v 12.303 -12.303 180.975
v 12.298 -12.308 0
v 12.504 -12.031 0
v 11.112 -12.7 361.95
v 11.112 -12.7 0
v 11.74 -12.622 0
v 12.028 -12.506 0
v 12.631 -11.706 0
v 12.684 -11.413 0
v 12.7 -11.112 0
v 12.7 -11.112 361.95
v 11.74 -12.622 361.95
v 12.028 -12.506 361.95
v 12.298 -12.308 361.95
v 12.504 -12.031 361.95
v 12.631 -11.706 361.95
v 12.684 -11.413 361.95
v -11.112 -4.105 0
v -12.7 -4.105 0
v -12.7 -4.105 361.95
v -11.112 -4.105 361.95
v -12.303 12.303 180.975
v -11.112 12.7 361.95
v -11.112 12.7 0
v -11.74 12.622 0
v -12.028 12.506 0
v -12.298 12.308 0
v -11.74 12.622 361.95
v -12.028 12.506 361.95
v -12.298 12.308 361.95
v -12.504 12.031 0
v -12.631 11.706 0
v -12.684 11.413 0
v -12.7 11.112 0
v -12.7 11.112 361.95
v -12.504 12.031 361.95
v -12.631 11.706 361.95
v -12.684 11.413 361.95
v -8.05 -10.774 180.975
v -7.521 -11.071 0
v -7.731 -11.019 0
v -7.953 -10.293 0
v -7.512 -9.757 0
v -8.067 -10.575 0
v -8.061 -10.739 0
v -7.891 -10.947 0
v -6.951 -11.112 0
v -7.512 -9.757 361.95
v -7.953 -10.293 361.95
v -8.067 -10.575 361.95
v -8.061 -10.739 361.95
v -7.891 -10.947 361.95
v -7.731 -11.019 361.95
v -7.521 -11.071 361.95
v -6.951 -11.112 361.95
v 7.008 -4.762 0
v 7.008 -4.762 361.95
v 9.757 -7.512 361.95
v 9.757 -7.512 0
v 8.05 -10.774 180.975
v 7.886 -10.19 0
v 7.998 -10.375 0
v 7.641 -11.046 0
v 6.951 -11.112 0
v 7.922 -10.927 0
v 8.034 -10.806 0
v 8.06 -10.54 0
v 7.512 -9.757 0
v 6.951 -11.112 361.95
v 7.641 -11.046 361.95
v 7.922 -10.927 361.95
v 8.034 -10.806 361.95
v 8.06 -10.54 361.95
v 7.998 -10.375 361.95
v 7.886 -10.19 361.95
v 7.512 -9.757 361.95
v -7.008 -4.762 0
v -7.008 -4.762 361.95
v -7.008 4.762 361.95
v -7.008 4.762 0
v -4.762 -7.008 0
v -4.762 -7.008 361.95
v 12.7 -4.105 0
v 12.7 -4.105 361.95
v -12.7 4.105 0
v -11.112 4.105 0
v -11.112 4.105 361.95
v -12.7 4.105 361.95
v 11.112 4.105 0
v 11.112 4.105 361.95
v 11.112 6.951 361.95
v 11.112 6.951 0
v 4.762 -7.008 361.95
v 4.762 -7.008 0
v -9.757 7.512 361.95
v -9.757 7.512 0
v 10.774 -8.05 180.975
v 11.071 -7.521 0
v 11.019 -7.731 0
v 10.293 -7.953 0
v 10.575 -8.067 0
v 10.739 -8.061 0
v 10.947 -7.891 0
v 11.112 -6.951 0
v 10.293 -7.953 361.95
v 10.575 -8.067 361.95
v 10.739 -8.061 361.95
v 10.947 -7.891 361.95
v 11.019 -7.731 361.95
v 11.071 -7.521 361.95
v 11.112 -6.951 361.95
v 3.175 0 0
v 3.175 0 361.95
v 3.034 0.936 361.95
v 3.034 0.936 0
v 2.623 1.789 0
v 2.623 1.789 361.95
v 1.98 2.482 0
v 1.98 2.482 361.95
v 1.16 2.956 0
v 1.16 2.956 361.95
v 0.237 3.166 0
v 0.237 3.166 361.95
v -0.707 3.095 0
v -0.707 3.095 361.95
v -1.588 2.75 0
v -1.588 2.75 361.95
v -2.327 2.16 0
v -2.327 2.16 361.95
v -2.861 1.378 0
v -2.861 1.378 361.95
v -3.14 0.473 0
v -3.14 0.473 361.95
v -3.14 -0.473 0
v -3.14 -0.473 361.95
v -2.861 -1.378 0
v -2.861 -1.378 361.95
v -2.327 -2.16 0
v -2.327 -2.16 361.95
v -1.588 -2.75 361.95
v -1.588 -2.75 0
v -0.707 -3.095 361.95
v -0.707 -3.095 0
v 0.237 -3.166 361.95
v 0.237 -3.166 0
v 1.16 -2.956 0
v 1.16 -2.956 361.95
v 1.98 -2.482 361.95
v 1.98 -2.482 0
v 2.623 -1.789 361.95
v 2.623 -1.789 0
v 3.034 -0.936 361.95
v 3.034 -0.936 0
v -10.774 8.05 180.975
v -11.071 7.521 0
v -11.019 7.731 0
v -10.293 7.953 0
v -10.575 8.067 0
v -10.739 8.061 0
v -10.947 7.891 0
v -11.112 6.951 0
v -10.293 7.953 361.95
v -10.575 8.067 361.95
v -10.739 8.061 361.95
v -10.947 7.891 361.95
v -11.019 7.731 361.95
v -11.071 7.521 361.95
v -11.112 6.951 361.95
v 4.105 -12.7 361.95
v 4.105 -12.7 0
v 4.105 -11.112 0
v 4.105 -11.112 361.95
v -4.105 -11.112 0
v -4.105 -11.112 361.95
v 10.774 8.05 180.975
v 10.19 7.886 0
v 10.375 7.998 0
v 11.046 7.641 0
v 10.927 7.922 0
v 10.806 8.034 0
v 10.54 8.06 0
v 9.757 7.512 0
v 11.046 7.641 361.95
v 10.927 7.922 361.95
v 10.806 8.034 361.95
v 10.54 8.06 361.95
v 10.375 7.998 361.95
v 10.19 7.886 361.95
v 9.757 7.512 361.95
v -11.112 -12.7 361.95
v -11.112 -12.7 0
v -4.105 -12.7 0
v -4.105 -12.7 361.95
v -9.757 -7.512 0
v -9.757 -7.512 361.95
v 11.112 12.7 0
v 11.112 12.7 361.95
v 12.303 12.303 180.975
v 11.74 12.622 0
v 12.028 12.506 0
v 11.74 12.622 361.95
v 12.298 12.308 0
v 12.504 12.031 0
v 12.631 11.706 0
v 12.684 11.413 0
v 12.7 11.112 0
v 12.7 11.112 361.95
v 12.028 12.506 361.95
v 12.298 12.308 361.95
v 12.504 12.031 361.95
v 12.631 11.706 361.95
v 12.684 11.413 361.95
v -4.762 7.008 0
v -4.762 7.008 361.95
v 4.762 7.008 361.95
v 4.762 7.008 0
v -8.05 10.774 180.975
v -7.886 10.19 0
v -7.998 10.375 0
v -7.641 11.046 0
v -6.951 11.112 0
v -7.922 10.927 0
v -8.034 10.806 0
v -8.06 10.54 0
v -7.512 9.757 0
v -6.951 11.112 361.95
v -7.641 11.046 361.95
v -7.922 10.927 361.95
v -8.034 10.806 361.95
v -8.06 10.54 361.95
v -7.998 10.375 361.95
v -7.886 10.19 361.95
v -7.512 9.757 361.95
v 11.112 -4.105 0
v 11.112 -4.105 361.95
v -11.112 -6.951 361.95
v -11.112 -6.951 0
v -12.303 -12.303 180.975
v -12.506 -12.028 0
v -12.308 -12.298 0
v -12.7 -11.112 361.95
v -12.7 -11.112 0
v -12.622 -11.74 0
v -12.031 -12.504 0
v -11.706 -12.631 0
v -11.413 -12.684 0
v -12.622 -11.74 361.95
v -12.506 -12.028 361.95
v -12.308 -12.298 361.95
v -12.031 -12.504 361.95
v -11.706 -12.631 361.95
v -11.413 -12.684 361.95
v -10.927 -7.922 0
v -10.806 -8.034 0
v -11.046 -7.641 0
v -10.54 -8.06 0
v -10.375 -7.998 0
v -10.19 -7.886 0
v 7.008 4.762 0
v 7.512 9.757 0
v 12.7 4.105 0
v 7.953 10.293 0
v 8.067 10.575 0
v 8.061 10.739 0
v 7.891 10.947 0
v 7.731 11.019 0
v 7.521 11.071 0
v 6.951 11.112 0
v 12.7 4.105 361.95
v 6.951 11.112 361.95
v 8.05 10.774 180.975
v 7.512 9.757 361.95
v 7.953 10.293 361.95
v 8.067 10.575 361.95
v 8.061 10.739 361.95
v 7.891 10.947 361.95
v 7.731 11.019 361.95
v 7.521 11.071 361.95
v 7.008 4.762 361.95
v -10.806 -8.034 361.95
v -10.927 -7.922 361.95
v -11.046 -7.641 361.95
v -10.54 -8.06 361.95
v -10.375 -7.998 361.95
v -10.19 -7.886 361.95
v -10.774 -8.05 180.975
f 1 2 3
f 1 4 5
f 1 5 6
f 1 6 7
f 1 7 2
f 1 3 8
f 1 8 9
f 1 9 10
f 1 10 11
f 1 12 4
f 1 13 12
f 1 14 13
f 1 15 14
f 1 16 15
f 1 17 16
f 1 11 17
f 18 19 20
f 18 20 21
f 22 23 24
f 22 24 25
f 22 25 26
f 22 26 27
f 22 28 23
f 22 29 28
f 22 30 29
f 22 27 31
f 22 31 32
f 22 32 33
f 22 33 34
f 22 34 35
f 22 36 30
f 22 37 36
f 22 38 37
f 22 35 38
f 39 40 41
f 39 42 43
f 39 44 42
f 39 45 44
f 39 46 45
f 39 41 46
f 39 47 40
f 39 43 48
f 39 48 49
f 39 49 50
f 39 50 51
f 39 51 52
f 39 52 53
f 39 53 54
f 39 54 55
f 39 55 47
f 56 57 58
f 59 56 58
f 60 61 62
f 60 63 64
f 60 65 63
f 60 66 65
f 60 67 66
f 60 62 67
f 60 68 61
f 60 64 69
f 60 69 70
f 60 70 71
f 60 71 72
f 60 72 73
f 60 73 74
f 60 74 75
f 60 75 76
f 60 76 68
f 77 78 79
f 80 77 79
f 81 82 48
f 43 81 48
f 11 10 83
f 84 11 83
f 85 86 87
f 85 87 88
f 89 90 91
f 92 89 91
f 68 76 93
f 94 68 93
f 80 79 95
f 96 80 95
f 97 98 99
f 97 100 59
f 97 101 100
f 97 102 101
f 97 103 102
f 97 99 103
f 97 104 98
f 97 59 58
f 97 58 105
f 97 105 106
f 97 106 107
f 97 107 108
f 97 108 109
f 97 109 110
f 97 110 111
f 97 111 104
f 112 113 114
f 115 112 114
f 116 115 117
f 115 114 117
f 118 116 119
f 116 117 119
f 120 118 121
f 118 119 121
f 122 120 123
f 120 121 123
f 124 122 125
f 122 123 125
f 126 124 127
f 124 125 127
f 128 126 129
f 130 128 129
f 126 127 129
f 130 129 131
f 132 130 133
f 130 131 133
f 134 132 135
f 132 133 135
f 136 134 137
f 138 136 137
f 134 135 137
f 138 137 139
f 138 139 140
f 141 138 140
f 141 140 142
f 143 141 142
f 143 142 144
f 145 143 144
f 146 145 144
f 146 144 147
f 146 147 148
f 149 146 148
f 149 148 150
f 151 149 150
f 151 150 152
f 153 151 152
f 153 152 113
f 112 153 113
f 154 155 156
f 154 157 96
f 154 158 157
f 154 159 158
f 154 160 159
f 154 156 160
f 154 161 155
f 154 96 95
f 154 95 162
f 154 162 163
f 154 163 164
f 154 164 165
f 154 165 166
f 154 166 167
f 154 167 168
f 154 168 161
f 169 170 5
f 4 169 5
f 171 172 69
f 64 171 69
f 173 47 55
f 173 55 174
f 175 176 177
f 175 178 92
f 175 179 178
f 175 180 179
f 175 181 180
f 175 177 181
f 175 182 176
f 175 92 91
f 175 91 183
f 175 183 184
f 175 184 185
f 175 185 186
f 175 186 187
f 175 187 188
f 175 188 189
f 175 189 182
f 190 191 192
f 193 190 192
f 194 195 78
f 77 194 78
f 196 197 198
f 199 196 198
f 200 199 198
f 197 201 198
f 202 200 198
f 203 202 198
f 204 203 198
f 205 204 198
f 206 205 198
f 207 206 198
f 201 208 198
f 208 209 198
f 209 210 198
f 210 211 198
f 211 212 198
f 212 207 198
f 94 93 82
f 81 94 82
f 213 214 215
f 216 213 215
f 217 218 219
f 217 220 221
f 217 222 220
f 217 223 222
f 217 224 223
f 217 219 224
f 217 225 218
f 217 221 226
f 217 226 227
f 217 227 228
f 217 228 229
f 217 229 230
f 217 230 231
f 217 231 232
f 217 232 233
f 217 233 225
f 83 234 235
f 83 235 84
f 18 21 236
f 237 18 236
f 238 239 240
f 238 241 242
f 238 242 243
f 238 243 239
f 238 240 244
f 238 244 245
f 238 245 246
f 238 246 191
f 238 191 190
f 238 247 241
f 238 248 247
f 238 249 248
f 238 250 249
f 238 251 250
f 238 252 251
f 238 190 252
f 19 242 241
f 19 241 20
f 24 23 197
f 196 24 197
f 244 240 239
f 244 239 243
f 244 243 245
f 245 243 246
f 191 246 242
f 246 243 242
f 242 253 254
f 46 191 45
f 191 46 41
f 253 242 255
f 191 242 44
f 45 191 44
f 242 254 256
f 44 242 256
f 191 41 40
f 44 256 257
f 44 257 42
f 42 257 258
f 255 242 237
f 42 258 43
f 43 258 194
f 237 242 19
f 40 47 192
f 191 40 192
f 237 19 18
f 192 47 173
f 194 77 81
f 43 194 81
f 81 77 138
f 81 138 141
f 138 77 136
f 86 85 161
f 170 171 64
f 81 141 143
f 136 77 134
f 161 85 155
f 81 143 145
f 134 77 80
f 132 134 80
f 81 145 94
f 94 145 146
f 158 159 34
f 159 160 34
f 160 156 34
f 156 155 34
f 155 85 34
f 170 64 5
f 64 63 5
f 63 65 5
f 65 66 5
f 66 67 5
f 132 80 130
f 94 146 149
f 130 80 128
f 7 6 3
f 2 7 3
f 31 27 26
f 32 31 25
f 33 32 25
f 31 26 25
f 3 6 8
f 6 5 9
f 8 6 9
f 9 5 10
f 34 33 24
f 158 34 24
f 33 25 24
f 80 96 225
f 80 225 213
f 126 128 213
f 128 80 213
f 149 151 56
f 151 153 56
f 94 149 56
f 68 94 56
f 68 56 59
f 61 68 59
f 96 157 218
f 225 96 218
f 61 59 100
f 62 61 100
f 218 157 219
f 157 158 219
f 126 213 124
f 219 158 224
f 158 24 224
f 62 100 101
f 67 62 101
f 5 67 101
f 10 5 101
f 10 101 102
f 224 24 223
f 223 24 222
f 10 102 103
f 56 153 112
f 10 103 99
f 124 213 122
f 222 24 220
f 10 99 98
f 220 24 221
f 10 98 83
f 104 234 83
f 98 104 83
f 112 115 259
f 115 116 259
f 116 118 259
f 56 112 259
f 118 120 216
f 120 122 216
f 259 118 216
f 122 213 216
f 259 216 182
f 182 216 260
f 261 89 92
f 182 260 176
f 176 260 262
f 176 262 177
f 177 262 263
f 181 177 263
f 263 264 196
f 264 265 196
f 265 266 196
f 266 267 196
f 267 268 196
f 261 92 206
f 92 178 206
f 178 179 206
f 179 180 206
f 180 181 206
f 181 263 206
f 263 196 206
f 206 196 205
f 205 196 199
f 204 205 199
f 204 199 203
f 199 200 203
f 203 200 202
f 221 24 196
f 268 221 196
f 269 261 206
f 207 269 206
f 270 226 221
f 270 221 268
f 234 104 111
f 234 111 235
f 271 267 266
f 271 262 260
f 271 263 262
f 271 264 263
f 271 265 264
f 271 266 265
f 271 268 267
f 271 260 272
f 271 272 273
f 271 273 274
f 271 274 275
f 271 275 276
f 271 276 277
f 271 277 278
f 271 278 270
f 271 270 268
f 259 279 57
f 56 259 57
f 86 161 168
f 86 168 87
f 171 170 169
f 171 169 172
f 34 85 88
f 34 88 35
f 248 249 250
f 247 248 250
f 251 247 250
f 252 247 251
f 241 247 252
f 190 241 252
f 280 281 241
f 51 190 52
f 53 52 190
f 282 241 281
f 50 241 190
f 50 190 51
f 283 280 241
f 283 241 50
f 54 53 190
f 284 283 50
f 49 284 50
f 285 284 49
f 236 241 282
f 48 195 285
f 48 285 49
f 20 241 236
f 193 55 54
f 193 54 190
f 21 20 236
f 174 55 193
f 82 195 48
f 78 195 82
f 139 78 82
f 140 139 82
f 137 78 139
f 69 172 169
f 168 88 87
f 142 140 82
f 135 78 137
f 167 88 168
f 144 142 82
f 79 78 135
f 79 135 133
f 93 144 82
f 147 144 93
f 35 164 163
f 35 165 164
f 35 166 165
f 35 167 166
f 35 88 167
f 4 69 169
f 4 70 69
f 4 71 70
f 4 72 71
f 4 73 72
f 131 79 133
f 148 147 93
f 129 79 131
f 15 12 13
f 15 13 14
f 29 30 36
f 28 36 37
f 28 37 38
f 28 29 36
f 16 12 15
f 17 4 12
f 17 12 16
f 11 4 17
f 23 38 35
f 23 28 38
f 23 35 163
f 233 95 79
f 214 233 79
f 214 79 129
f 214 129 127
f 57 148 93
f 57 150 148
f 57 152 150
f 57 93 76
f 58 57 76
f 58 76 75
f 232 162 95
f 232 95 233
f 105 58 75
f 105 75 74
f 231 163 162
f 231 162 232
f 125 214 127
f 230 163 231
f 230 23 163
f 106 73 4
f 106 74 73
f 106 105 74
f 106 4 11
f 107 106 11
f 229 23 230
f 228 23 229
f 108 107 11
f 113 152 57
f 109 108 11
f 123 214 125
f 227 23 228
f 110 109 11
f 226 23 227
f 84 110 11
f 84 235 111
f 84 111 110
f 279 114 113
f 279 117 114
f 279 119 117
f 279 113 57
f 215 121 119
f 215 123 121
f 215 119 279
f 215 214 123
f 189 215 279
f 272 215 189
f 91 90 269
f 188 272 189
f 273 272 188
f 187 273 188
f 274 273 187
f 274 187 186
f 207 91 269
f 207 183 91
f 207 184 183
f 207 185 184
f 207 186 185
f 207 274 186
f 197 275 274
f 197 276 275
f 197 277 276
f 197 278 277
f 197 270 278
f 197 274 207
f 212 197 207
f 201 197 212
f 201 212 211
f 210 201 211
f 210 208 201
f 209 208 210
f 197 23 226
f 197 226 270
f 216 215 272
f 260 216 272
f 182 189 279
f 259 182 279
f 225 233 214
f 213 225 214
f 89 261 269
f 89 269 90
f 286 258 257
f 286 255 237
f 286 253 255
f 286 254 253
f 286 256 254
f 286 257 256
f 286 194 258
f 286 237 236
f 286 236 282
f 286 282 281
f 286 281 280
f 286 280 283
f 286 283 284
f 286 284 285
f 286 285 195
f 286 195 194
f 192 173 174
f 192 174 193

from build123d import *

# Parameters (mm, degrees)
F0_W        = 25.4
F0_H        = 25.4
F1_DEPTH    = 455.93
F3_DEPTH    = 455.93
F4_R        = 3.175
F5_DEPTH    = 455.93
F6_T1_DEPTH = 463.8675
F7_T1_DEPTH = 455.93
F8_W        = 8.2098719395
F8_H        = 1.5875
F9_DEPTH    = 455.93
F10_DEPTH   = 93.98


# Not quite as in the source:
# - a fillet or chamfer that OpenCascade refuses, or shapes differently, is made with other operations: its cross-section is extruded or revolved along the edge and cut away or added


with BuildPart() as f1:
    # F0 (on Top) → F1 (new body)
    with BuildSketch(Plane.XY):
        Rectangle(F0_W, F0_H)
    extrude(amount=F1_DEPTH)

    # F2 (on face) → F3 (cut)
    with BuildSketch(Plane.XY.offset(455.93)):
        Polygon((-7.0075640303, -4.7625), (-7.0075640303, 4.7625), (-11.1125, 8.8674359697), (-11.1125, 4.1049359697), (-12.7, 4.1049359697), (-12.7, -4.1049359697), (-11.1125, -4.1049359697), (-11.1125, -8.8674359697), align=None)
        Polygon((4.1049359697, 12.7), (-4.1049359697, 12.7), (-4.1049359697, 11.1125), (-8.8674359697, 11.1125), (-4.7625, 7.0075640303), (4.7625, 7.0075640303), (8.8674359697, 11.1125), (4.1049359697, 11.1125), align=None)
        Polygon((12.7, -4.1049359697), (12.7, 4.1049359697), (11.1125, 4.1049359697), (11.1125, 8.8674359697), (7.0075640303, 4.7625), (7.0075640303, -4.7625), (11.1125, -8.8674359697), (11.1125, -4.1049359697), align=None)
        Polygon((-4.1049359697, -11.1125), (-4.1049359697, -12.7), (4.1049359697, -12.7), (4.1049359697, -11.1125), (8.8674359697, -11.1125), (4.7625, -7.0075640303), (-4.7625, -7.0075640303), (-8.8674359697, -11.1125), align=None)
    extrude(amount=-F3_DEPTH, mode=Mode.SUBTRACT)

    # F4 (on face) → F5 (cut)
    with BuildSketch(Plane.XY.offset(455.93)):
        Circle(F4_R)
    extrude(amount=-F5_DEPTH, mode=Mode.SUBTRACT)

    # F6: fillet of radius 1.5875 on 4 edges, made by hand

    # F6_s2 → F6_t1 (cut)
    with BuildSketch(Plane.XY.offset(-3.96875)):
        with BuildLine():
            add(Edge.make_bspline(
                [(-12.7, 11.1125), (-12.7, 12.7), (-11.1125, 12.7)],
                knots=[0, 0, 0, 1, 1, 1], degree=2, weights=[1, 1, 1]))
            Line((-11.1125, 12.7), (-12.7, 12.7))
            Line((-12.7, 12.7), (-12.7, 11.1125))
        make_face()
        with BuildLine():
            add(Edge.make_bspline(
                [(12.7, 11.1125), (12.7, 12.7), (11.1125, 12.7)],
                knots=[0, 0, 0, 1, 1, 1], degree=2, weights=[1, 1, 1]))
            Line((11.1125, 12.7), (12.7, 12.7))
            Line((12.7, 12.7), (12.7, 11.1125))
        make_face()
        with BuildLine():
            add(Edge.make_bspline(
                [(12.7, -11.1125), (12.7, -12.7), (11.1125, -12.7)],
                knots=[0, 0, 0, 1, 1, 1], degree=2, weights=[1, 1, 1]))
            Line((11.1125, -12.7), (12.7, -12.7))
            Line((12.7, -12.7), (12.7, -11.1125))
        make_face()
        with BuildLine():
            add(Edge.make_bspline(
                [(-11.1125, -12.7), (-12.7, -12.7), (-12.7, -11.1125)],
                knots=[0, 0, 0, 1, 1, 1], degree=2, weights=[1, 1, 1]))
            Line((-12.7, -11.1125), (-12.7, -12.7))
            Line((-12.7, -12.7), (-11.1125, -12.7))
        make_face()
    extrude(amount=F6_T1_DEPTH, mode=Mode.SUBTRACT)

    # F7: fillet of radius 0.79375 on 8 edges, made by hand

    # F7_s2 → F7_t1 (join)
    with BuildSketch(Plane.XY):
        with BuildLine():
            add(Edge.make_bspline(
                [(-9.7574839924, 7.5124199622), (-11.1125, 8.8674359697), (-11.1125, 6.9511539546)],
                knots=[0, 0, 0, 1, 1, 1], degree=2, weights=[1, 1, 1]))
            Line((-11.1125, 6.9511539546), (-11.1125, 8.8674359697))
            Line((-11.1125, 8.8674359697), (-9.7574839924, 7.5124199622))
        make_face()
        with BuildLine():
            add(Edge.make_bspline(
                [(11.1125, 6.9511539546), (11.1125, 8.8674359697), (9.7574839924, 7.5124199622)],
                knots=[0, 0, 0, 1, 1, 1], degree=2, weights=[1, 1, 1]))
            Line((9.7574839924, 7.5124199622), (11.1125, 8.8674359697))
            Line((11.1125, 8.8674359697), (11.1125, 6.9511539546))
        make_face()
        with BuildLine():
            add(Edge.make_bspline(
                [(9.7574839924, -7.5124199622), (11.1125, -8.8674359697), (11.1125, -6.9511539546)],
                knots=[0, 0, 0, 1, 1, 1], degree=2, weights=[1, 1, 1]))
            Line((11.1125, -6.9511539546), (11.1125, -8.8674359697))
            Line((11.1125, -8.8674359697), (9.7574839924, -7.5124199622))
        make_face()
        with BuildLine():
            add(Edge.make_bspline(
                [(-11.1125, -6.9511539546), (-11.1125, -8.8674359697), (-9.7574839924, -7.5124199622)],
                knots=[0, 0, 0, 1, 1, 1], degree=2, weights=[1, 1, 1]))
            Line((-9.7574839924, -7.5124199622), (-11.1125, -8.8674359697))
            Line((-11.1125, -8.8674359697), (-11.1125, -6.9511539546))
        make_face()
        with BuildLine():
            add(Edge.make_bspline(
                [(-7.5124199622, -9.7574839924), (-8.8674359697, -11.1125), (-6.9511539546, -11.1125)],
                knots=[0, 0, 0, 1, 1, 1], degree=2, weights=[1, 1, 1]))
            Line((-6.9511539546, -11.1125), (-8.8674359697, -11.1125))
            Line((-8.8674359697, -11.1125), (-7.5124199622, -9.7574839924))
        make_face()
        with BuildLine():
            add(Edge.make_bspline(
                [(6.9511539546, -11.1125), (8.8674359697, -11.1125), (7.5124199622, -9.7574839924)],
                knots=[0, 0, 0, 1, 1, 1], degree=2, weights=[1, 1, 1]))
            Line((7.5124199622, -9.7574839924), (8.8674359697, -11.1125))
            Line((8.8674359697, -11.1125), (6.9511539546, -11.1125))
        make_face()
        with BuildLine():
            add(Edge.make_bspline(
                [(7.5124199622, 9.7574839924), (8.8674359697, 11.1125), (6.9511539546, 11.1125)],
                knots=[0, 0, 0, 1, 1, 1], degree=2, weights=[1, 1, 1]))
            Line((6.9511539546, 11.1125), (8.8674359697, 11.1125))
            Line((8.8674359697, 11.1125), (7.5124199622, 9.7574839924))
        make_face()
        with BuildLine():
            add(Edge.make_bspline(
                [(-6.9511539546, 11.1125), (-8.8674359697, 11.1125), (-7.5124199622, 9.7574839924)],
                knots=[0, 0, 0, 1, 1, 1], degree=2, weights=[1, 1, 1]))
            Line((-7.5124199622, 9.7574839924), (-8.8674359697, 11.1125))
            Line((-8.8674359697, 11.1125), (-6.9511539546, 11.1125))
        make_face()
    extrude(amount=F7_T1_DEPTH)

    # F8 (on face) → F9 (join)
    with BuildSketch(Plane.XY.offset(455.93)):
        with Locations((0, 11.90625)):
            Rectangle(F8_W, F8_H)
    extrude(amount=-F9_DEPTH)

    # F10 (cut): a face of the model
    f10_faces = [f1.faces().sort_by_distance(p)[0] for p in [
        (4.4641462174, -11.90625, 455.93),
    ]]
    extrude(f10_faces, amount=-F10_DEPTH, mode=Mode.SUBTRACT)


solid = f1.part
